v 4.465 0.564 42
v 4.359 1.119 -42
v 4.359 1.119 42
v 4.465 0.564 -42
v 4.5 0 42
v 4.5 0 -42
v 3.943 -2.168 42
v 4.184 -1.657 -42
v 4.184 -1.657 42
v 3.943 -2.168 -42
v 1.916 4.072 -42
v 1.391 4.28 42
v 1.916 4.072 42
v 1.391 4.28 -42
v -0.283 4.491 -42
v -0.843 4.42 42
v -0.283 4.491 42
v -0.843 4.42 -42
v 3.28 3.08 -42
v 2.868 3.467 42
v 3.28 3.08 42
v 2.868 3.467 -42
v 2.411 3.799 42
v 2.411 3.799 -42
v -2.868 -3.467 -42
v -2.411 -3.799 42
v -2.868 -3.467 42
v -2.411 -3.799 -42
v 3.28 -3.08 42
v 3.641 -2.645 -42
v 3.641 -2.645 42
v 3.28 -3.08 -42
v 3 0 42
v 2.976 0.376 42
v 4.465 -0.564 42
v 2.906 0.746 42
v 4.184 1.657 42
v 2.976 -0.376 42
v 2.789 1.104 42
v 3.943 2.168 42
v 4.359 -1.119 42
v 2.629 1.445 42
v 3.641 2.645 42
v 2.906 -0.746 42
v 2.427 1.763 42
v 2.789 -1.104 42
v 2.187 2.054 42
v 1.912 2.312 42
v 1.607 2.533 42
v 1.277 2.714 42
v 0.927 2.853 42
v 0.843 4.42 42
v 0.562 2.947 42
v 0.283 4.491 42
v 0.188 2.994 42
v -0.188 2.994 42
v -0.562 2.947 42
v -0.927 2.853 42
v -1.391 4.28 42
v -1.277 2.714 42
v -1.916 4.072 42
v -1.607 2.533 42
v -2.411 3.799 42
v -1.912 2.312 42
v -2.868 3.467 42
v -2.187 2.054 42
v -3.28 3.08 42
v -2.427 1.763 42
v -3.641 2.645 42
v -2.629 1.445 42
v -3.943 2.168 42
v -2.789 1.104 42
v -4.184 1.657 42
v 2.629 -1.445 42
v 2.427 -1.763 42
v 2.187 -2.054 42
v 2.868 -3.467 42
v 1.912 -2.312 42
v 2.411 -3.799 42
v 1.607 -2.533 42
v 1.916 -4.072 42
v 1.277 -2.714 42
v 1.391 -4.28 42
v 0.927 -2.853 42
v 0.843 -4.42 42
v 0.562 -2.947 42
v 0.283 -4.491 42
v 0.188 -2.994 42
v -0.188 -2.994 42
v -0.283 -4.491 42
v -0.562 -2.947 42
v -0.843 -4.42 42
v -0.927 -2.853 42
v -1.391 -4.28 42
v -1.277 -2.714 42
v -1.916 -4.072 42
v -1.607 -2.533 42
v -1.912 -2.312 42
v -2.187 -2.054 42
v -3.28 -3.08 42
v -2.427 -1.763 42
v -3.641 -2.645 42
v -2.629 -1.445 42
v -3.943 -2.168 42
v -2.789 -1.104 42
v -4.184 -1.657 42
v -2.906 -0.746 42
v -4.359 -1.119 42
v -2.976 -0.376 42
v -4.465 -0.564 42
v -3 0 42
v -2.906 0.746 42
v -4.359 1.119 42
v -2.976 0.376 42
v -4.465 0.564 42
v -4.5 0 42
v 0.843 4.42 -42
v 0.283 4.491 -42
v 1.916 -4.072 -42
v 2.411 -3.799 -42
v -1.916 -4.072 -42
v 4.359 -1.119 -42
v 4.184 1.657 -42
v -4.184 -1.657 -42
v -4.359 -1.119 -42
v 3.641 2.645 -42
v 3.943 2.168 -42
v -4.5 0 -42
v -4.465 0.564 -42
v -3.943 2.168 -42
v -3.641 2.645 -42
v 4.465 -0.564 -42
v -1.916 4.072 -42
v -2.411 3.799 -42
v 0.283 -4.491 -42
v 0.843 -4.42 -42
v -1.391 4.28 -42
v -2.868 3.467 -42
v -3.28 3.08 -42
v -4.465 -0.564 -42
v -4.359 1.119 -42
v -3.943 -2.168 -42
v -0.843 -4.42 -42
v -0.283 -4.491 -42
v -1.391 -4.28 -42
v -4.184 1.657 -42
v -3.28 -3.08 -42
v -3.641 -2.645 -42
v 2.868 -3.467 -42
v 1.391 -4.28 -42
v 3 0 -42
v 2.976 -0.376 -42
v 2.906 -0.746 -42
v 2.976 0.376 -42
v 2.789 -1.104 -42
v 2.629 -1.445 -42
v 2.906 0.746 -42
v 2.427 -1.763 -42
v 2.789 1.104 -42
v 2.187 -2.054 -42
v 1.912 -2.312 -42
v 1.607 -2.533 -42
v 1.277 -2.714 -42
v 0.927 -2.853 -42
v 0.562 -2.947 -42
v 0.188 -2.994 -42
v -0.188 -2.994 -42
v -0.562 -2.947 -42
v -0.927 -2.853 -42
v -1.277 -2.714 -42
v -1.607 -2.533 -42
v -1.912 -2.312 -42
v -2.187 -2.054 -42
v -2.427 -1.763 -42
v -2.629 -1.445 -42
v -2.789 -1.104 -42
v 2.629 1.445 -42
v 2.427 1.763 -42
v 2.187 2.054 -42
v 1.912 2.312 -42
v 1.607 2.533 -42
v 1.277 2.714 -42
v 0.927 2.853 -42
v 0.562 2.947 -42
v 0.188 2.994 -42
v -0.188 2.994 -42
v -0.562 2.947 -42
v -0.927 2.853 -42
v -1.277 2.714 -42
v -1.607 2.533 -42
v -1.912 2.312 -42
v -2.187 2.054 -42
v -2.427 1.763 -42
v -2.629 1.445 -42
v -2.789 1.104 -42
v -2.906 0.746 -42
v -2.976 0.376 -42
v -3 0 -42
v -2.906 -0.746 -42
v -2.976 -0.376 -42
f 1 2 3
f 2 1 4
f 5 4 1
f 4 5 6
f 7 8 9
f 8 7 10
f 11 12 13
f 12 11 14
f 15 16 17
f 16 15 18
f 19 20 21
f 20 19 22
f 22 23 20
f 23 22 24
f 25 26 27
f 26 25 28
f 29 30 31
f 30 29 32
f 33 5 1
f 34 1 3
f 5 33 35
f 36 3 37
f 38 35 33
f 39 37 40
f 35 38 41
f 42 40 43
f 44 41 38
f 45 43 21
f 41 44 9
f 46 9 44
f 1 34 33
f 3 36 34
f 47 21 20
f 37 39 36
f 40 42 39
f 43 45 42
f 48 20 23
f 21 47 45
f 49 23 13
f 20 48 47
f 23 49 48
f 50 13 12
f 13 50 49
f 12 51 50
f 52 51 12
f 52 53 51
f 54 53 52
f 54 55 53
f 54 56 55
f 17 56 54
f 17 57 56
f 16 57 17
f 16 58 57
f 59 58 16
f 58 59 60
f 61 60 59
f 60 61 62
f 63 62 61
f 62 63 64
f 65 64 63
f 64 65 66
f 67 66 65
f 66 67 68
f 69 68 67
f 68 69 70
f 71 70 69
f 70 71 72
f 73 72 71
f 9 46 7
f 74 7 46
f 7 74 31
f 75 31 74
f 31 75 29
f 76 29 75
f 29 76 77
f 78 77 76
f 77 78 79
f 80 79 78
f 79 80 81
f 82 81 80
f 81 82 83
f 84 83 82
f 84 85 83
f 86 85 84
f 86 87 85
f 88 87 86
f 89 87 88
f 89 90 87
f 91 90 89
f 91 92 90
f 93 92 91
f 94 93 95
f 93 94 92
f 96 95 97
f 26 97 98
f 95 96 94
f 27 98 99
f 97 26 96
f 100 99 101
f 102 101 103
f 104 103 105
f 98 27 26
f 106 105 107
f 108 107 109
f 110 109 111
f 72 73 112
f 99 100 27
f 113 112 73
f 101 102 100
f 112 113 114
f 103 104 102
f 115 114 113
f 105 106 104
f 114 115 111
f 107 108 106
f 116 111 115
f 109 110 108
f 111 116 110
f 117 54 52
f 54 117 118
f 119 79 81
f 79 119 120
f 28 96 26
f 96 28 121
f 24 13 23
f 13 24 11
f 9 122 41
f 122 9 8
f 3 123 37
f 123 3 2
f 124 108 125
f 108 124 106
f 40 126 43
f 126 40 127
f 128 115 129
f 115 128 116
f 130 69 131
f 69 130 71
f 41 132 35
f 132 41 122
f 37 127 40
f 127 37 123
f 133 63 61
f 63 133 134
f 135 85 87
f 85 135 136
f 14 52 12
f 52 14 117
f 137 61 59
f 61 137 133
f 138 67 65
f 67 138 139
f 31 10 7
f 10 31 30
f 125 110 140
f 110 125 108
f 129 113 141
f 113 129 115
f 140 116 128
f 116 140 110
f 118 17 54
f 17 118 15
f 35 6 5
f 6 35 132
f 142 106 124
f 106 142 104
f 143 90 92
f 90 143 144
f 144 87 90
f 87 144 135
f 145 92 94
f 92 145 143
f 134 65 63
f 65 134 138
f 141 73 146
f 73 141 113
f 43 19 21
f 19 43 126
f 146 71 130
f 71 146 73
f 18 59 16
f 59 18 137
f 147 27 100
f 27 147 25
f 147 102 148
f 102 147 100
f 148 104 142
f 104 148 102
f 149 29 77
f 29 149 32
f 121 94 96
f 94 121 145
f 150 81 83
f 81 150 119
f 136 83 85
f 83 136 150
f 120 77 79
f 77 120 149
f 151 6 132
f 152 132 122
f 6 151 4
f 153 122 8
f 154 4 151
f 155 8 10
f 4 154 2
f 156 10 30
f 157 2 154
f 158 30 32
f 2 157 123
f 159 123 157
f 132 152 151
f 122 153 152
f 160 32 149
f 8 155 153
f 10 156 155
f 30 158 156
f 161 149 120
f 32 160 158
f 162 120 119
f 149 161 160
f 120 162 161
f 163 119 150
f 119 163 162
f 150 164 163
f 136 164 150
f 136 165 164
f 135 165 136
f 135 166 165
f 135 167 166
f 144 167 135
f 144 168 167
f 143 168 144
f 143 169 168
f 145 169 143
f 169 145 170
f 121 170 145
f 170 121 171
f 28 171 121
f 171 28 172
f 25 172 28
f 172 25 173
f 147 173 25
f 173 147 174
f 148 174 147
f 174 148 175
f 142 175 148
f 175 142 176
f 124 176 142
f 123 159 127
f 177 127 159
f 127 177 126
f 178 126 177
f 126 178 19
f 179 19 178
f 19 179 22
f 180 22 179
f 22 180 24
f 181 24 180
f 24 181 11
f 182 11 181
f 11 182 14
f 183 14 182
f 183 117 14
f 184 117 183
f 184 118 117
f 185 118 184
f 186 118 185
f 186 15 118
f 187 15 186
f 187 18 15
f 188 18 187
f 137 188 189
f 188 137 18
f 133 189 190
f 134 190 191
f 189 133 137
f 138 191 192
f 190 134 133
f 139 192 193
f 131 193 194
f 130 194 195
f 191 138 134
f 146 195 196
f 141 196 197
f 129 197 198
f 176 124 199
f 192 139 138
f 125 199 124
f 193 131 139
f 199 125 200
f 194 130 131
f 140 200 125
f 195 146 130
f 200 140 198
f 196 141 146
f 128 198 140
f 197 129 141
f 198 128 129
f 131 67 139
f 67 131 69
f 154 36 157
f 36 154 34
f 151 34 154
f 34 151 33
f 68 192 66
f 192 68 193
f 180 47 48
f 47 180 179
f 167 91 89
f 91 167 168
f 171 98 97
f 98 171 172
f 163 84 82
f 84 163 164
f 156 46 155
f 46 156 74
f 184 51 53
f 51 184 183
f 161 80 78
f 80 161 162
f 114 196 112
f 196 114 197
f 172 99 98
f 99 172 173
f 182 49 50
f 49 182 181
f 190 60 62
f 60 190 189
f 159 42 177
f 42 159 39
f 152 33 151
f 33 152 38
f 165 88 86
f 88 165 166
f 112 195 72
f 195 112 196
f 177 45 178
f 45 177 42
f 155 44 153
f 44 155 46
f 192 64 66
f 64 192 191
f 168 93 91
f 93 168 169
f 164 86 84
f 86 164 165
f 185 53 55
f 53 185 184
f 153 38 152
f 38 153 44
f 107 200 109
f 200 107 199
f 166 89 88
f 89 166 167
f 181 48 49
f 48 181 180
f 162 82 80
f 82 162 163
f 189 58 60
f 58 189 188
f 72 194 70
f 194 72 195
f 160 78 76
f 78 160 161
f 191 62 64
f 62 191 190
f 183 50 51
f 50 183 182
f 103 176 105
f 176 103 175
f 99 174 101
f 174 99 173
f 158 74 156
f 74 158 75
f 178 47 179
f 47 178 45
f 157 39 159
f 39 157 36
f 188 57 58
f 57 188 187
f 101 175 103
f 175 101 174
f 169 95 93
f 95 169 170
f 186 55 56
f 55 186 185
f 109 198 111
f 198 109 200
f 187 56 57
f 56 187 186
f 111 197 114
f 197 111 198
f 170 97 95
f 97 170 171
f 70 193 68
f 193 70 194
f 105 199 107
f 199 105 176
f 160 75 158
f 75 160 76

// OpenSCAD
$fn = 50;


difference() {
	union() {
		translate(v = [0, 0, -42.0000000000]) {
			cylinder(h = 84, r = 4.5000000000);
		}
	}
	union() {
		translate(v = [0, 0, -100.0000000000]) {
			cylinder(h = 200, r = 3.0000000000);
		}
	}
}
